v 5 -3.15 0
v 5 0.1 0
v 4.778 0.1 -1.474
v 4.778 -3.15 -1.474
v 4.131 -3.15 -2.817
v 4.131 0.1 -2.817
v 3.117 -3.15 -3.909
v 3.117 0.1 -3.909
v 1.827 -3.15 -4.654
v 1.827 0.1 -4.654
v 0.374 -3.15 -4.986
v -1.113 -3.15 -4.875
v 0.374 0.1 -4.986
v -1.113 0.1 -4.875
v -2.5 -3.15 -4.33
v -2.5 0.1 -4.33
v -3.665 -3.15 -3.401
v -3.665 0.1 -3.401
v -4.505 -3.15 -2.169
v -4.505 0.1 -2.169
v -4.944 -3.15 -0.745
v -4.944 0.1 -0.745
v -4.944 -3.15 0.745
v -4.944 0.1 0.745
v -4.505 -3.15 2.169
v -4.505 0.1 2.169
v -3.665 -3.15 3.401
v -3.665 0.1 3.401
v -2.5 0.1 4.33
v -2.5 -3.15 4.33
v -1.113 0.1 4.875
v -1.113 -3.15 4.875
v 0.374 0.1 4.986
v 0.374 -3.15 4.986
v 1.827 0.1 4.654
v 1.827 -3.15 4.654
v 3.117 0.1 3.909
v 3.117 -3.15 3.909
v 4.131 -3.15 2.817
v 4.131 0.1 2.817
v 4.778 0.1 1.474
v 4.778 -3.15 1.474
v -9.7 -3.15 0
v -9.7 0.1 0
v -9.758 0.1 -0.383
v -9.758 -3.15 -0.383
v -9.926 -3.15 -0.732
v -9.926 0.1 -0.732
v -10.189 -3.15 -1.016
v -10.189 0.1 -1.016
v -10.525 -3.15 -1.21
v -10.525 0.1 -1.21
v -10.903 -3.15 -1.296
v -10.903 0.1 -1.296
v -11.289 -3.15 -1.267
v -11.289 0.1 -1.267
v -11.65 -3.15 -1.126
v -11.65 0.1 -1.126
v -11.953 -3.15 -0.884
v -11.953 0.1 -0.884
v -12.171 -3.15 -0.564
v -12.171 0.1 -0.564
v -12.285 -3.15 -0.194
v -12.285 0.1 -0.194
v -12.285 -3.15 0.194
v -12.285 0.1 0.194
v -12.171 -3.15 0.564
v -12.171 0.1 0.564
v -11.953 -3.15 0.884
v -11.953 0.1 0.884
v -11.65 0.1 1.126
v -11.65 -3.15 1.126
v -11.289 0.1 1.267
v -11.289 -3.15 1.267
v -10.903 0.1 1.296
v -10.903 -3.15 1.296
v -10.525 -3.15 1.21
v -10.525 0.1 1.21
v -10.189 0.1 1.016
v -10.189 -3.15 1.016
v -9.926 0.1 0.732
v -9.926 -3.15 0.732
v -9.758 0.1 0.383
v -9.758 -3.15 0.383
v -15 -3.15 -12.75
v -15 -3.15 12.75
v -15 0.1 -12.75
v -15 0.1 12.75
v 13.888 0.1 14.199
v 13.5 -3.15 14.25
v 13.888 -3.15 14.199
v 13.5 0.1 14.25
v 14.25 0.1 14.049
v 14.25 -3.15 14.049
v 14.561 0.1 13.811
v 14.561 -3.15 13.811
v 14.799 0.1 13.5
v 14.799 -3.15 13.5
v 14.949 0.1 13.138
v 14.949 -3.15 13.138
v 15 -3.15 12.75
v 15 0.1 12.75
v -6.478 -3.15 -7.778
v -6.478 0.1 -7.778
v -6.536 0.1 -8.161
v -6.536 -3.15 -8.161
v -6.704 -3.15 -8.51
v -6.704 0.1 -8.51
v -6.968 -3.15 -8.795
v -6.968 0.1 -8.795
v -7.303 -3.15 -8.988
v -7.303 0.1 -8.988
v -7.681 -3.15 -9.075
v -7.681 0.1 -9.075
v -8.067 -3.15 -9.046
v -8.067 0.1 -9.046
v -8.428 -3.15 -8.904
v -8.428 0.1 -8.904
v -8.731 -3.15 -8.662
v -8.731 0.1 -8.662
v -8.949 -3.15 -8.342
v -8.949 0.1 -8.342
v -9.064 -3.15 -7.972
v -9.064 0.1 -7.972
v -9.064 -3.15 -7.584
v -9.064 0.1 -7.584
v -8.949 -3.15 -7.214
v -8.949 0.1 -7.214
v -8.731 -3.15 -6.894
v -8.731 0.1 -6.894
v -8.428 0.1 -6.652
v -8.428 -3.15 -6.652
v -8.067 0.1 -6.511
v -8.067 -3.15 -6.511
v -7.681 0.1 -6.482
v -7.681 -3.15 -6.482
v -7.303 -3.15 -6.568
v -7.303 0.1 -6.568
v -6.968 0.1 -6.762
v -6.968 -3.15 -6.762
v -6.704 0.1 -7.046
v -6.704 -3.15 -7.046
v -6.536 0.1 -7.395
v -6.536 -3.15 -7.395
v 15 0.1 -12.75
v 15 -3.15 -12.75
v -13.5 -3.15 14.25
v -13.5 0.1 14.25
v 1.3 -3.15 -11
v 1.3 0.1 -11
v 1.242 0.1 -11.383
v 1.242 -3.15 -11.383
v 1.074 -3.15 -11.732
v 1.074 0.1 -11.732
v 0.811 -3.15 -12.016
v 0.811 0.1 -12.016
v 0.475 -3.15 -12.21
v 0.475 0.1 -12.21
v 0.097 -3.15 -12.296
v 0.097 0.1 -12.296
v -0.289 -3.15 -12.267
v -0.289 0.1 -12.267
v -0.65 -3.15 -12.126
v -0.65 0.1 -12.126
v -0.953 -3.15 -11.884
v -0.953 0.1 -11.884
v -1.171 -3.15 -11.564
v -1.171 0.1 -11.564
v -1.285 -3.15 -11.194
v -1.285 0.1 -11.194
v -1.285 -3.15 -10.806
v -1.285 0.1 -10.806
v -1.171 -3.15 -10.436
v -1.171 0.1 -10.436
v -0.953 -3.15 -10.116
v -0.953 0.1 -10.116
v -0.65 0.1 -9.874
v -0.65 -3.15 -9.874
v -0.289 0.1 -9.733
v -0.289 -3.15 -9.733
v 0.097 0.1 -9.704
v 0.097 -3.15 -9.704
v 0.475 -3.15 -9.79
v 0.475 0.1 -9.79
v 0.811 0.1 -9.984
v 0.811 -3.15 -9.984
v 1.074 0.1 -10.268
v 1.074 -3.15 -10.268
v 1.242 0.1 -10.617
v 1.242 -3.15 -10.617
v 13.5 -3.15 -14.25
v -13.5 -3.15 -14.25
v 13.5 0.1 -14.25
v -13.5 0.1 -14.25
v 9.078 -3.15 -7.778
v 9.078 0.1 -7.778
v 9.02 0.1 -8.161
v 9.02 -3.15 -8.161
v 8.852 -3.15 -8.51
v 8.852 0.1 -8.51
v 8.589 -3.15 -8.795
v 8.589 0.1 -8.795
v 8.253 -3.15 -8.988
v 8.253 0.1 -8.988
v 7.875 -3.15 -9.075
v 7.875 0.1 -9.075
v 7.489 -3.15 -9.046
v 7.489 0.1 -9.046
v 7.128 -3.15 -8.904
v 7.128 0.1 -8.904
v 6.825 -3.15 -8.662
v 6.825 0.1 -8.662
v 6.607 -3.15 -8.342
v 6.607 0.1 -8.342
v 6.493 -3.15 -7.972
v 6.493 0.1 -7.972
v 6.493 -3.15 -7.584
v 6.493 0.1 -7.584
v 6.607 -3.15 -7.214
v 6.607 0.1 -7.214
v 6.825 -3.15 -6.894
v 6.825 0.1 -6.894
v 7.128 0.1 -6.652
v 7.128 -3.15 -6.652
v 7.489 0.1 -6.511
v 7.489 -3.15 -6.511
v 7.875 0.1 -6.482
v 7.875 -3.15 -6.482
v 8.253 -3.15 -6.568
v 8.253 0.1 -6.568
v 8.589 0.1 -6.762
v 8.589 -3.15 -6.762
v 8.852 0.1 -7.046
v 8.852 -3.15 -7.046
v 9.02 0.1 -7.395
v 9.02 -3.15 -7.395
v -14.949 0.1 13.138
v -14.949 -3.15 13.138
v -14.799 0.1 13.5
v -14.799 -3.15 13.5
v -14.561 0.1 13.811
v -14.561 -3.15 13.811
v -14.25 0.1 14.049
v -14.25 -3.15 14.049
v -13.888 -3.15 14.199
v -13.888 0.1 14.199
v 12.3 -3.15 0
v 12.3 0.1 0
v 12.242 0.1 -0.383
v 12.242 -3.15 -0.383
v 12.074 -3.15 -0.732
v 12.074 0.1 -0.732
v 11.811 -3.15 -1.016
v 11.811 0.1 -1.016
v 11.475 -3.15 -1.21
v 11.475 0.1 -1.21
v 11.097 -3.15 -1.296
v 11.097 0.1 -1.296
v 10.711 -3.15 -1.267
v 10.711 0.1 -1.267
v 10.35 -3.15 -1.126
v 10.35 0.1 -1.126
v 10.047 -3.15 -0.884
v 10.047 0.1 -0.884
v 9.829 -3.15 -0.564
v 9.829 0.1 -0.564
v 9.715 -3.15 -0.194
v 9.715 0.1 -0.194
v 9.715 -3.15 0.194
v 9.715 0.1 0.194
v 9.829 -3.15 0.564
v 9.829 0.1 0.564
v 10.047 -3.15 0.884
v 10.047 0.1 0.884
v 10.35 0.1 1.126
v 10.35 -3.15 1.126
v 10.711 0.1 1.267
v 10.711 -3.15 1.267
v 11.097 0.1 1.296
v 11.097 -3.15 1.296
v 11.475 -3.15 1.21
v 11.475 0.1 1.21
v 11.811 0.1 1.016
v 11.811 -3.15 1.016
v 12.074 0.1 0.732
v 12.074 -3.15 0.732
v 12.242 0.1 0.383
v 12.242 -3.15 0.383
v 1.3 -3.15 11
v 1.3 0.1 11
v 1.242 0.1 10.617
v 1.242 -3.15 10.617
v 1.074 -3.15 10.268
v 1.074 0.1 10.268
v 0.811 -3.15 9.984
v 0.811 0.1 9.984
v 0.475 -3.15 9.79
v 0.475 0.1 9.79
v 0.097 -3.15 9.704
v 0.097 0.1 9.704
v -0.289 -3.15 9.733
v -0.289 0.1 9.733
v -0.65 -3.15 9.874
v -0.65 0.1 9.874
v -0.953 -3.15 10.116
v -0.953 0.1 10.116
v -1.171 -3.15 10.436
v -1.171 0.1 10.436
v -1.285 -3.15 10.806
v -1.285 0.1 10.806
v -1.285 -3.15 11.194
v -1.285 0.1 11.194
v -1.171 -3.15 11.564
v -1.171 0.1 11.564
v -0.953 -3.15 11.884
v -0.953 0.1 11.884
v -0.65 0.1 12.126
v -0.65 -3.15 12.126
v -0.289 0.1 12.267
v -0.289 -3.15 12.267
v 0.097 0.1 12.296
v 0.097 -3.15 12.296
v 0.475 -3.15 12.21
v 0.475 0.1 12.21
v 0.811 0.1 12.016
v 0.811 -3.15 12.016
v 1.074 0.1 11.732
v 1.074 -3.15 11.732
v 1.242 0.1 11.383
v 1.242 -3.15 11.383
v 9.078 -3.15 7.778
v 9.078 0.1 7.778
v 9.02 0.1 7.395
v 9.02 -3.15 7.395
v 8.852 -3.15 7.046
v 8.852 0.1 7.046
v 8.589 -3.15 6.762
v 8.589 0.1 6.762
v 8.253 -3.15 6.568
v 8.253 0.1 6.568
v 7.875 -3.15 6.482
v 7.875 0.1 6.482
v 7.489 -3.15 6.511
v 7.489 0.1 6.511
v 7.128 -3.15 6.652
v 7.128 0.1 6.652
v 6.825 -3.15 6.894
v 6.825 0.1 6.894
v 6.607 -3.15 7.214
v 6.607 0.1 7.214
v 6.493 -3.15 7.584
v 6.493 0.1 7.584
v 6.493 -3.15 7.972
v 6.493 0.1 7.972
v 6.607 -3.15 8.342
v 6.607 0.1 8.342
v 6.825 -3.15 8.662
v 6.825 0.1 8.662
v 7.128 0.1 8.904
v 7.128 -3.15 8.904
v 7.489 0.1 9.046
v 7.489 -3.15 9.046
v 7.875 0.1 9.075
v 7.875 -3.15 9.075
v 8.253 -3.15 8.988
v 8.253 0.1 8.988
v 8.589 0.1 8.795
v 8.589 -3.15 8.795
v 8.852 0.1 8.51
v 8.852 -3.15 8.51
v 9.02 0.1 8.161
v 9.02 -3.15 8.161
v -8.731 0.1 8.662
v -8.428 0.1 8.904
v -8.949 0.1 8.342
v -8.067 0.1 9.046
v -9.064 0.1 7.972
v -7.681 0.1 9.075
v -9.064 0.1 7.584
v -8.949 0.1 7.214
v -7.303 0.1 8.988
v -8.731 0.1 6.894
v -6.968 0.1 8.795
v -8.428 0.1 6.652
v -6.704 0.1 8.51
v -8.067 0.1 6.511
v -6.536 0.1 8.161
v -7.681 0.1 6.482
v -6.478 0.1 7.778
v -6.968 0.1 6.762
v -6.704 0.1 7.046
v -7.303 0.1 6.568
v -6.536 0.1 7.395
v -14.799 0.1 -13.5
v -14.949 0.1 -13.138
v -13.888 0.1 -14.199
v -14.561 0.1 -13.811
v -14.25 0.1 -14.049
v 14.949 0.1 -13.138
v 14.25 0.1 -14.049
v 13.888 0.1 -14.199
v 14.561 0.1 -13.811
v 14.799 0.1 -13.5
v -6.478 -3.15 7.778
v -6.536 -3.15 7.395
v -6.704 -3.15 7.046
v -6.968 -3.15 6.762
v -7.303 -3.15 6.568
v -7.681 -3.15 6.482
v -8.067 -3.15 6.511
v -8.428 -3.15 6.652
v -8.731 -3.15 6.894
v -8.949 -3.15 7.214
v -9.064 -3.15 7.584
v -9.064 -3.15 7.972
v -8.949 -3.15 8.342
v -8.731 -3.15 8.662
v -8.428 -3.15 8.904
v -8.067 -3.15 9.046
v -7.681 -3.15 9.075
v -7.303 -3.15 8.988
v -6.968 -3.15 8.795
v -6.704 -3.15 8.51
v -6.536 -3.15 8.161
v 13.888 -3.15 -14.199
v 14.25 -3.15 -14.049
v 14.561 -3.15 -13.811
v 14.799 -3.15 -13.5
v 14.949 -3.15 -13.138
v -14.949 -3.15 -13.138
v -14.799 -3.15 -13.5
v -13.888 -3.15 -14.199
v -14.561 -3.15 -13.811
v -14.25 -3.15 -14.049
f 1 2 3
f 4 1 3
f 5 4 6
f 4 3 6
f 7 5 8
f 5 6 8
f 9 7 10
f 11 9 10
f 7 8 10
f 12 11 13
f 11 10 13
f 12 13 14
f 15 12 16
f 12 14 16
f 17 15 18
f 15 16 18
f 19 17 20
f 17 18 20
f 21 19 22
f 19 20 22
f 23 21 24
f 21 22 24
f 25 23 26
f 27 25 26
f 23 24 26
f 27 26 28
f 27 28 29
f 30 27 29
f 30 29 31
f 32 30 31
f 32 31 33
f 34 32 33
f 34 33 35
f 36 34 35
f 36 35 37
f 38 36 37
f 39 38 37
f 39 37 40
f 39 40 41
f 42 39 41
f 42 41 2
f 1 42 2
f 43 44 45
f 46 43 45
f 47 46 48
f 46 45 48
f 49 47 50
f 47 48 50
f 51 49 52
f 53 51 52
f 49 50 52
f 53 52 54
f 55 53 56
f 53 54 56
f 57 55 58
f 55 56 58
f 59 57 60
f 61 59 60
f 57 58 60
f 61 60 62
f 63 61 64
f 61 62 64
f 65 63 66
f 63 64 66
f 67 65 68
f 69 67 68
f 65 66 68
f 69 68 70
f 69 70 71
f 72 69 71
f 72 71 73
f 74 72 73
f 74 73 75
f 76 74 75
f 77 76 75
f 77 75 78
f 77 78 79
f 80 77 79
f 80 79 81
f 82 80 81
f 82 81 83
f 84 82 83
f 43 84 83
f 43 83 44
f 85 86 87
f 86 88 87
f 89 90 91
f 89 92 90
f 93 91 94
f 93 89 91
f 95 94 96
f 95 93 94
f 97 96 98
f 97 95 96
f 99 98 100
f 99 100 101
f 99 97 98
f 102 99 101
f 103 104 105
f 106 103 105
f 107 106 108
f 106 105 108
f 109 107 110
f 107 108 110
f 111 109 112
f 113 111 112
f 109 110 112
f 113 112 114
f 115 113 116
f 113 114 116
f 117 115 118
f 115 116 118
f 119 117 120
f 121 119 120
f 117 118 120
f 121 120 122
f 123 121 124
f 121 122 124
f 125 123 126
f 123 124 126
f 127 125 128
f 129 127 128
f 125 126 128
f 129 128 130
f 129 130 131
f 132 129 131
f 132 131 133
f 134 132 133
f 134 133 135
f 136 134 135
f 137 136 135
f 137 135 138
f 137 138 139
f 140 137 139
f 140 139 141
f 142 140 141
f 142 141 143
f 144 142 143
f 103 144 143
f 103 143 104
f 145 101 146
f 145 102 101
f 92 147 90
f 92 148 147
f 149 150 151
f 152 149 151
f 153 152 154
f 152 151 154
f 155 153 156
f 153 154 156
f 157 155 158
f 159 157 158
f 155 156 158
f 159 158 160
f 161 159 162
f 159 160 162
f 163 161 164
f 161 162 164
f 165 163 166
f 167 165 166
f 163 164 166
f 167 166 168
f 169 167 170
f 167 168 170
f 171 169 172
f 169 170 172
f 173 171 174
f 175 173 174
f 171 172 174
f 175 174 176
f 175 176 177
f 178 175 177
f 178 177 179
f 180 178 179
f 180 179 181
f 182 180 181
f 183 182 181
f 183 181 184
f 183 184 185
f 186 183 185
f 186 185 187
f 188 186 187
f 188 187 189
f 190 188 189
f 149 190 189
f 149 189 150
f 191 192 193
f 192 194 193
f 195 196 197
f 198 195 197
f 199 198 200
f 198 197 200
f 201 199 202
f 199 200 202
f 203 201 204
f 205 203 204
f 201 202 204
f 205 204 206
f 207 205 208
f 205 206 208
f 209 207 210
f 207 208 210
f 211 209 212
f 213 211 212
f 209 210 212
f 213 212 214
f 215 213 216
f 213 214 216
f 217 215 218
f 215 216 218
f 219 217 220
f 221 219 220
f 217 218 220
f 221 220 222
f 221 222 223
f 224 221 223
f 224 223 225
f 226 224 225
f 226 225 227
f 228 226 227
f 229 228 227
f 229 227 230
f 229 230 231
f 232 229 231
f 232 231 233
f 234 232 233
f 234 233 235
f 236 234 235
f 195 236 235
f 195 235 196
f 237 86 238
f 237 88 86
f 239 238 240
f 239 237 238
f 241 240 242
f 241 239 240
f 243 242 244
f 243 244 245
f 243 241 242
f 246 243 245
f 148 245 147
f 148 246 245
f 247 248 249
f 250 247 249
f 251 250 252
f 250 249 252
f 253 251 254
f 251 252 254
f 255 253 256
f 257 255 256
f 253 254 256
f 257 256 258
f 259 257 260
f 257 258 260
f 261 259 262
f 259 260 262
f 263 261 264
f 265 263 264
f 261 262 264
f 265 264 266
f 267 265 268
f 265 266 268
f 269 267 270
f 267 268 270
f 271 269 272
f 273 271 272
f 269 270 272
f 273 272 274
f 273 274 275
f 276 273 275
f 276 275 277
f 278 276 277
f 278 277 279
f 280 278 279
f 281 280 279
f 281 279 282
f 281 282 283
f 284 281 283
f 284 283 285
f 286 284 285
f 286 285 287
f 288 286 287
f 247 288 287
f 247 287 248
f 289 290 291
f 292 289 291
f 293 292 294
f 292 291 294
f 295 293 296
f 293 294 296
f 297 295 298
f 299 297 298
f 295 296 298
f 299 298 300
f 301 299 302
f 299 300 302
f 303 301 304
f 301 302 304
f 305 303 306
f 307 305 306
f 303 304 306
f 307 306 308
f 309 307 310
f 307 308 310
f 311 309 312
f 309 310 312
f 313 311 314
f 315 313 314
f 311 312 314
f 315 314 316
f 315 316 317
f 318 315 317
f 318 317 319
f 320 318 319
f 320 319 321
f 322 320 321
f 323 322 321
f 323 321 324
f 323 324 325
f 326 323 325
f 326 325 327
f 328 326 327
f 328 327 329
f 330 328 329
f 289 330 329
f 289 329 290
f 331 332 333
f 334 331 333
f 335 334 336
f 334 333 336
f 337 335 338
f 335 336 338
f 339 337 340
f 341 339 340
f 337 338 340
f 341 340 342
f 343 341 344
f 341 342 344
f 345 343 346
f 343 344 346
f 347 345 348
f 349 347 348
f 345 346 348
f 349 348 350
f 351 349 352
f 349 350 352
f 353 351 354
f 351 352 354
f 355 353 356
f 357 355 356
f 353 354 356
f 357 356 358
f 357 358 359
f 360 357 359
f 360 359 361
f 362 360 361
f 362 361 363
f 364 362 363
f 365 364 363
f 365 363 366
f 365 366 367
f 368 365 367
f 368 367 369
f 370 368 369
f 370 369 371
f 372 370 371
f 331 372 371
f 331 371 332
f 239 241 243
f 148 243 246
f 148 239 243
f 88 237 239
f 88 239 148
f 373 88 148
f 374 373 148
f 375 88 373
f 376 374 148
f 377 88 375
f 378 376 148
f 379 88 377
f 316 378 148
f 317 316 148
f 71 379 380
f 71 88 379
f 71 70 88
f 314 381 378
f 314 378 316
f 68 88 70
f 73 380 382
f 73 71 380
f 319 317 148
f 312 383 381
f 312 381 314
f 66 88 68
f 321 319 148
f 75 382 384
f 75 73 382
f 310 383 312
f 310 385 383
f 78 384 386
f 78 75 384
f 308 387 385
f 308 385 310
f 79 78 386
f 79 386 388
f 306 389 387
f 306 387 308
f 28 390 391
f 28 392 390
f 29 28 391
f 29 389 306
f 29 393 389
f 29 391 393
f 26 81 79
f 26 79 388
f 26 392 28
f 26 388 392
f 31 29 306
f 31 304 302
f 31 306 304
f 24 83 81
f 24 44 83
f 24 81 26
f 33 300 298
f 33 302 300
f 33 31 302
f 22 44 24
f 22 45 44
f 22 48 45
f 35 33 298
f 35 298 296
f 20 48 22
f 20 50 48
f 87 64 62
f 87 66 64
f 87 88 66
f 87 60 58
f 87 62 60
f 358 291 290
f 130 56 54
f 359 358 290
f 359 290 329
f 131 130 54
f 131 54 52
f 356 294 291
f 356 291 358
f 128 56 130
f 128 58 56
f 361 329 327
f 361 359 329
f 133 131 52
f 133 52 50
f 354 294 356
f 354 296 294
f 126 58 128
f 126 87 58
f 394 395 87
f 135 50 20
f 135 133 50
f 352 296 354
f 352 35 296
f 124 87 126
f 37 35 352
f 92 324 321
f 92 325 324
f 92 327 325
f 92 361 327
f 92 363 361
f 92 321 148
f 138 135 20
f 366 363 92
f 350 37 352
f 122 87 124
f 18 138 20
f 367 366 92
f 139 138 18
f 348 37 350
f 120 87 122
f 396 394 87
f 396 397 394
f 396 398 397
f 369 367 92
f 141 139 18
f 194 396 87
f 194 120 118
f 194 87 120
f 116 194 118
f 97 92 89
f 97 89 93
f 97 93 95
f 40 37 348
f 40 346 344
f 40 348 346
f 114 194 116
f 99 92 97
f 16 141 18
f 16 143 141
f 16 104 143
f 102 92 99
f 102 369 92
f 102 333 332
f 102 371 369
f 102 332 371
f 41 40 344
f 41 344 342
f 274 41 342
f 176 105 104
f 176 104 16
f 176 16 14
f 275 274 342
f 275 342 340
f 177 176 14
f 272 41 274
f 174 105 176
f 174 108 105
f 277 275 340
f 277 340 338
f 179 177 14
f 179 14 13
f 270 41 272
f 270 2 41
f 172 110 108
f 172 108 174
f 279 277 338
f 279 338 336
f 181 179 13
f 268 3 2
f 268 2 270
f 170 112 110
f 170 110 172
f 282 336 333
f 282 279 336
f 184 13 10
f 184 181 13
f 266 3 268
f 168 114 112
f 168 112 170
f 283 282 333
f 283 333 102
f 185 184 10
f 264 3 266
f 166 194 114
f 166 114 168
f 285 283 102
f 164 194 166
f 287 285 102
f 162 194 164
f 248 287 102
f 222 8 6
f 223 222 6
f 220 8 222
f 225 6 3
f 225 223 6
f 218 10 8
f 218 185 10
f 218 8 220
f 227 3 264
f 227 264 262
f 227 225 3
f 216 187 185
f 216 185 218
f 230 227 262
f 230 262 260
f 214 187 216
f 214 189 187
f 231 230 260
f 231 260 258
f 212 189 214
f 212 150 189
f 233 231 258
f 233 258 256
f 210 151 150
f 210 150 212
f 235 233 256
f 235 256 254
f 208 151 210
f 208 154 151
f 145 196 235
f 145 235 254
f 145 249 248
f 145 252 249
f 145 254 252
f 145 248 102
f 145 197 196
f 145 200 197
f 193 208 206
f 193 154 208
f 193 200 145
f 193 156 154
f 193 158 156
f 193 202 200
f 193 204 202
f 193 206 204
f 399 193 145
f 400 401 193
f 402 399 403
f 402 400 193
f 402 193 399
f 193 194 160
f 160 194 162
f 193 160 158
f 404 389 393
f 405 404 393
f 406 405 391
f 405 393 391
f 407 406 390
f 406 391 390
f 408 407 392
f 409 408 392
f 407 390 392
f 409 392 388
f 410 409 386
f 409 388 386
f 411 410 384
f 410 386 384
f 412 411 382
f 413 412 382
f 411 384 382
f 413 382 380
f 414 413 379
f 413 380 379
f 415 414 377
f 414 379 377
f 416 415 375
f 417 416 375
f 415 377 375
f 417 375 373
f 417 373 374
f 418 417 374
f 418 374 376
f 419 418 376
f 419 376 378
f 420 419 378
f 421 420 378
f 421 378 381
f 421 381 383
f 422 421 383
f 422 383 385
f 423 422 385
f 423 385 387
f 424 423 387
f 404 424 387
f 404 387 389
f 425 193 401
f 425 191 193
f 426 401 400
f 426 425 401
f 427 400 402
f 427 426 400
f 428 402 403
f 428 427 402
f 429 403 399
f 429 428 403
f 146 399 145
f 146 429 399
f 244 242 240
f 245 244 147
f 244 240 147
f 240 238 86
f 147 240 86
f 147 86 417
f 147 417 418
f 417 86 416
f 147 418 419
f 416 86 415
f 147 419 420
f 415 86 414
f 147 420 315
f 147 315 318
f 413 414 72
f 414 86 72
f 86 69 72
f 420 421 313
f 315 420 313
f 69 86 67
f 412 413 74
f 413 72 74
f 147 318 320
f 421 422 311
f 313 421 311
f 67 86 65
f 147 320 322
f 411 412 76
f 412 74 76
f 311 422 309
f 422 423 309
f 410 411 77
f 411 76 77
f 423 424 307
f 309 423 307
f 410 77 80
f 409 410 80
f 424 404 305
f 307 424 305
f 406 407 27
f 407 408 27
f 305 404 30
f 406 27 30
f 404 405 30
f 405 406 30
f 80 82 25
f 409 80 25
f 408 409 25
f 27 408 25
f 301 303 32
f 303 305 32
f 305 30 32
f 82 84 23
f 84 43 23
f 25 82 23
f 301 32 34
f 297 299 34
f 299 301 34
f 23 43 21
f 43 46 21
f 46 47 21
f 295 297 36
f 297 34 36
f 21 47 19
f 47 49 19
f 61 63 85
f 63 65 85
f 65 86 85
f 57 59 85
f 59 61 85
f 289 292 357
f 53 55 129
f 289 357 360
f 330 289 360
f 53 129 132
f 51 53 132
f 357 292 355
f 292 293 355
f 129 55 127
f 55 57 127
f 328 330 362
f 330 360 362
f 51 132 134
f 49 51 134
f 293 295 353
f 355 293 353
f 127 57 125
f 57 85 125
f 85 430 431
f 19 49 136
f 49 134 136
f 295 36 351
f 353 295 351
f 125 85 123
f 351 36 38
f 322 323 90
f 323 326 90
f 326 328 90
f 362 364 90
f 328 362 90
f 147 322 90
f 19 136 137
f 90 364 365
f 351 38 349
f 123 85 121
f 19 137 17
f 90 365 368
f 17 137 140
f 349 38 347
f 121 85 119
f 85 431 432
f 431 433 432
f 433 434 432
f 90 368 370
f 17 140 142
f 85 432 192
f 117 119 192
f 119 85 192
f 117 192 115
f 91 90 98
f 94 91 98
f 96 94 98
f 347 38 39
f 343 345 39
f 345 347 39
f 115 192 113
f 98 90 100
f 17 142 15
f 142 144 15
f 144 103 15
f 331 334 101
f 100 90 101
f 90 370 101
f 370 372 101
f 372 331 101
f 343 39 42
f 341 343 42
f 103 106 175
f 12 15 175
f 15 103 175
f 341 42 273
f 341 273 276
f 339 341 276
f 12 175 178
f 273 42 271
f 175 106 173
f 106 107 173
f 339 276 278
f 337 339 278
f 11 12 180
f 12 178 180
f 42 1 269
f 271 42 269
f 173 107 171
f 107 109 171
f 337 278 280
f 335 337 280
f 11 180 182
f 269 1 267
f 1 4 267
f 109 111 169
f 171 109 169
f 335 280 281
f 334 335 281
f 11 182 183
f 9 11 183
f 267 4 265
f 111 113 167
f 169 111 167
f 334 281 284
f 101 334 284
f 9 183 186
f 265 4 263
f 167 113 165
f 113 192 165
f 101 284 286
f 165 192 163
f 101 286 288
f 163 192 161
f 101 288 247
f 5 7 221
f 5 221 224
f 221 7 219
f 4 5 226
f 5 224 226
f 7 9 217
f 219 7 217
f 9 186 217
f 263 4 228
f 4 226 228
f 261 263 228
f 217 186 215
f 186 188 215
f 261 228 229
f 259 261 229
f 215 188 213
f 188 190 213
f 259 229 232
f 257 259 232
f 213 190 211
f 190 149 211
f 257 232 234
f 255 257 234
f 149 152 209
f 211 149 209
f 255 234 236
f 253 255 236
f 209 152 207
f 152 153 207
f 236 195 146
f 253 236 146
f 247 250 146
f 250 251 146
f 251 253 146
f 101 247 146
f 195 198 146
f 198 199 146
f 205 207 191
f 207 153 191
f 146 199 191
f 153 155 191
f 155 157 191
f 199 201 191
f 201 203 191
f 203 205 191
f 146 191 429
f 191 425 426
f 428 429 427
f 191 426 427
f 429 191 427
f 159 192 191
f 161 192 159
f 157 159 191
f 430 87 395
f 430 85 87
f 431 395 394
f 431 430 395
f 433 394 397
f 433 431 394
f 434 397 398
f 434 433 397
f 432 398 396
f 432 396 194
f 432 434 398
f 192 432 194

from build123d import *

# Parameters (mm, degrees)
SKETCH1_W                = 30
SKETCH1_H                = 28.5
BOSS_EXTRUDE1_DEPTH      = 0.1
BOSS_EXTRUDE1_DEPTH_BACK = 3.15
SKETCH2_R                = 5
SKETCH2_R_2              = 1.3
CUT_EXTRUDE1_DEPTH       = 4.25
FILLET1_R                = 1.5


with BuildPart() as part:
    # Sketch1 → Boss-Extrude1 (new body, two sides)
    with BuildSketch(Plane(origin=(0, 0, 0), x_dir=(1, 0, 0), z_dir=(0, 1, 0))) as boss_extrude1_sk:
        Rectangle(SKETCH1_W, SKETCH1_H)
    extrude(amount=BOSS_EXTRUDE1_DEPTH)
    extrude(boss_extrude1_sk.sketch, amount=-BOSS_EXTRUDE1_DEPTH_BACK)

    # Sketch2 → Cut-Extrude1 (cut, through all)
    with BuildSketch(Plane(origin=(0, 0.1, 0), x_dir=(1, 0, 0), z_dir=(0, 1, 0))):
        Circle(SKETCH2_R)
        with Locations((0, 11)):
            Circle(SKETCH2_R_2)
        with Locations((7.778174593, 7.778174593)):
            Circle(SKETCH2_R_2)
        with Locations((11, 0)):
            Circle(SKETCH2_R_2)
        with Locations((7.778174593, -7.778174593)):
            Circle(SKETCH2_R_2)
        with Locations((0, -11)):
            Circle(SKETCH2_R_2)
        with Locations((-7.778174593, -7.778174593)):
            Circle(SKETCH2_R_2)
        with Locations((-11, 0)):
            Circle(SKETCH2_R_2)
        with Locations((-7.778174593, 7.778174593)):
            Circle(SKETCH2_R_2)
    extrude(amount=-CUT_EXTRUDE1_DEPTH, mode=Mode.SUBTRACT)

    # Fillet1
    fillet1_edges = [part.edges().sort_by_distance(p)[0] for p in [
        (-15, -1.525, -14.25),
        (15, -1.525, -14.25),
        (15, -1.525, 14.25),
        (-15, -1.525, 14.25),
    ]]
    fillet(fillet1_edges, radius=FILLET1_R)


solid = part.part
